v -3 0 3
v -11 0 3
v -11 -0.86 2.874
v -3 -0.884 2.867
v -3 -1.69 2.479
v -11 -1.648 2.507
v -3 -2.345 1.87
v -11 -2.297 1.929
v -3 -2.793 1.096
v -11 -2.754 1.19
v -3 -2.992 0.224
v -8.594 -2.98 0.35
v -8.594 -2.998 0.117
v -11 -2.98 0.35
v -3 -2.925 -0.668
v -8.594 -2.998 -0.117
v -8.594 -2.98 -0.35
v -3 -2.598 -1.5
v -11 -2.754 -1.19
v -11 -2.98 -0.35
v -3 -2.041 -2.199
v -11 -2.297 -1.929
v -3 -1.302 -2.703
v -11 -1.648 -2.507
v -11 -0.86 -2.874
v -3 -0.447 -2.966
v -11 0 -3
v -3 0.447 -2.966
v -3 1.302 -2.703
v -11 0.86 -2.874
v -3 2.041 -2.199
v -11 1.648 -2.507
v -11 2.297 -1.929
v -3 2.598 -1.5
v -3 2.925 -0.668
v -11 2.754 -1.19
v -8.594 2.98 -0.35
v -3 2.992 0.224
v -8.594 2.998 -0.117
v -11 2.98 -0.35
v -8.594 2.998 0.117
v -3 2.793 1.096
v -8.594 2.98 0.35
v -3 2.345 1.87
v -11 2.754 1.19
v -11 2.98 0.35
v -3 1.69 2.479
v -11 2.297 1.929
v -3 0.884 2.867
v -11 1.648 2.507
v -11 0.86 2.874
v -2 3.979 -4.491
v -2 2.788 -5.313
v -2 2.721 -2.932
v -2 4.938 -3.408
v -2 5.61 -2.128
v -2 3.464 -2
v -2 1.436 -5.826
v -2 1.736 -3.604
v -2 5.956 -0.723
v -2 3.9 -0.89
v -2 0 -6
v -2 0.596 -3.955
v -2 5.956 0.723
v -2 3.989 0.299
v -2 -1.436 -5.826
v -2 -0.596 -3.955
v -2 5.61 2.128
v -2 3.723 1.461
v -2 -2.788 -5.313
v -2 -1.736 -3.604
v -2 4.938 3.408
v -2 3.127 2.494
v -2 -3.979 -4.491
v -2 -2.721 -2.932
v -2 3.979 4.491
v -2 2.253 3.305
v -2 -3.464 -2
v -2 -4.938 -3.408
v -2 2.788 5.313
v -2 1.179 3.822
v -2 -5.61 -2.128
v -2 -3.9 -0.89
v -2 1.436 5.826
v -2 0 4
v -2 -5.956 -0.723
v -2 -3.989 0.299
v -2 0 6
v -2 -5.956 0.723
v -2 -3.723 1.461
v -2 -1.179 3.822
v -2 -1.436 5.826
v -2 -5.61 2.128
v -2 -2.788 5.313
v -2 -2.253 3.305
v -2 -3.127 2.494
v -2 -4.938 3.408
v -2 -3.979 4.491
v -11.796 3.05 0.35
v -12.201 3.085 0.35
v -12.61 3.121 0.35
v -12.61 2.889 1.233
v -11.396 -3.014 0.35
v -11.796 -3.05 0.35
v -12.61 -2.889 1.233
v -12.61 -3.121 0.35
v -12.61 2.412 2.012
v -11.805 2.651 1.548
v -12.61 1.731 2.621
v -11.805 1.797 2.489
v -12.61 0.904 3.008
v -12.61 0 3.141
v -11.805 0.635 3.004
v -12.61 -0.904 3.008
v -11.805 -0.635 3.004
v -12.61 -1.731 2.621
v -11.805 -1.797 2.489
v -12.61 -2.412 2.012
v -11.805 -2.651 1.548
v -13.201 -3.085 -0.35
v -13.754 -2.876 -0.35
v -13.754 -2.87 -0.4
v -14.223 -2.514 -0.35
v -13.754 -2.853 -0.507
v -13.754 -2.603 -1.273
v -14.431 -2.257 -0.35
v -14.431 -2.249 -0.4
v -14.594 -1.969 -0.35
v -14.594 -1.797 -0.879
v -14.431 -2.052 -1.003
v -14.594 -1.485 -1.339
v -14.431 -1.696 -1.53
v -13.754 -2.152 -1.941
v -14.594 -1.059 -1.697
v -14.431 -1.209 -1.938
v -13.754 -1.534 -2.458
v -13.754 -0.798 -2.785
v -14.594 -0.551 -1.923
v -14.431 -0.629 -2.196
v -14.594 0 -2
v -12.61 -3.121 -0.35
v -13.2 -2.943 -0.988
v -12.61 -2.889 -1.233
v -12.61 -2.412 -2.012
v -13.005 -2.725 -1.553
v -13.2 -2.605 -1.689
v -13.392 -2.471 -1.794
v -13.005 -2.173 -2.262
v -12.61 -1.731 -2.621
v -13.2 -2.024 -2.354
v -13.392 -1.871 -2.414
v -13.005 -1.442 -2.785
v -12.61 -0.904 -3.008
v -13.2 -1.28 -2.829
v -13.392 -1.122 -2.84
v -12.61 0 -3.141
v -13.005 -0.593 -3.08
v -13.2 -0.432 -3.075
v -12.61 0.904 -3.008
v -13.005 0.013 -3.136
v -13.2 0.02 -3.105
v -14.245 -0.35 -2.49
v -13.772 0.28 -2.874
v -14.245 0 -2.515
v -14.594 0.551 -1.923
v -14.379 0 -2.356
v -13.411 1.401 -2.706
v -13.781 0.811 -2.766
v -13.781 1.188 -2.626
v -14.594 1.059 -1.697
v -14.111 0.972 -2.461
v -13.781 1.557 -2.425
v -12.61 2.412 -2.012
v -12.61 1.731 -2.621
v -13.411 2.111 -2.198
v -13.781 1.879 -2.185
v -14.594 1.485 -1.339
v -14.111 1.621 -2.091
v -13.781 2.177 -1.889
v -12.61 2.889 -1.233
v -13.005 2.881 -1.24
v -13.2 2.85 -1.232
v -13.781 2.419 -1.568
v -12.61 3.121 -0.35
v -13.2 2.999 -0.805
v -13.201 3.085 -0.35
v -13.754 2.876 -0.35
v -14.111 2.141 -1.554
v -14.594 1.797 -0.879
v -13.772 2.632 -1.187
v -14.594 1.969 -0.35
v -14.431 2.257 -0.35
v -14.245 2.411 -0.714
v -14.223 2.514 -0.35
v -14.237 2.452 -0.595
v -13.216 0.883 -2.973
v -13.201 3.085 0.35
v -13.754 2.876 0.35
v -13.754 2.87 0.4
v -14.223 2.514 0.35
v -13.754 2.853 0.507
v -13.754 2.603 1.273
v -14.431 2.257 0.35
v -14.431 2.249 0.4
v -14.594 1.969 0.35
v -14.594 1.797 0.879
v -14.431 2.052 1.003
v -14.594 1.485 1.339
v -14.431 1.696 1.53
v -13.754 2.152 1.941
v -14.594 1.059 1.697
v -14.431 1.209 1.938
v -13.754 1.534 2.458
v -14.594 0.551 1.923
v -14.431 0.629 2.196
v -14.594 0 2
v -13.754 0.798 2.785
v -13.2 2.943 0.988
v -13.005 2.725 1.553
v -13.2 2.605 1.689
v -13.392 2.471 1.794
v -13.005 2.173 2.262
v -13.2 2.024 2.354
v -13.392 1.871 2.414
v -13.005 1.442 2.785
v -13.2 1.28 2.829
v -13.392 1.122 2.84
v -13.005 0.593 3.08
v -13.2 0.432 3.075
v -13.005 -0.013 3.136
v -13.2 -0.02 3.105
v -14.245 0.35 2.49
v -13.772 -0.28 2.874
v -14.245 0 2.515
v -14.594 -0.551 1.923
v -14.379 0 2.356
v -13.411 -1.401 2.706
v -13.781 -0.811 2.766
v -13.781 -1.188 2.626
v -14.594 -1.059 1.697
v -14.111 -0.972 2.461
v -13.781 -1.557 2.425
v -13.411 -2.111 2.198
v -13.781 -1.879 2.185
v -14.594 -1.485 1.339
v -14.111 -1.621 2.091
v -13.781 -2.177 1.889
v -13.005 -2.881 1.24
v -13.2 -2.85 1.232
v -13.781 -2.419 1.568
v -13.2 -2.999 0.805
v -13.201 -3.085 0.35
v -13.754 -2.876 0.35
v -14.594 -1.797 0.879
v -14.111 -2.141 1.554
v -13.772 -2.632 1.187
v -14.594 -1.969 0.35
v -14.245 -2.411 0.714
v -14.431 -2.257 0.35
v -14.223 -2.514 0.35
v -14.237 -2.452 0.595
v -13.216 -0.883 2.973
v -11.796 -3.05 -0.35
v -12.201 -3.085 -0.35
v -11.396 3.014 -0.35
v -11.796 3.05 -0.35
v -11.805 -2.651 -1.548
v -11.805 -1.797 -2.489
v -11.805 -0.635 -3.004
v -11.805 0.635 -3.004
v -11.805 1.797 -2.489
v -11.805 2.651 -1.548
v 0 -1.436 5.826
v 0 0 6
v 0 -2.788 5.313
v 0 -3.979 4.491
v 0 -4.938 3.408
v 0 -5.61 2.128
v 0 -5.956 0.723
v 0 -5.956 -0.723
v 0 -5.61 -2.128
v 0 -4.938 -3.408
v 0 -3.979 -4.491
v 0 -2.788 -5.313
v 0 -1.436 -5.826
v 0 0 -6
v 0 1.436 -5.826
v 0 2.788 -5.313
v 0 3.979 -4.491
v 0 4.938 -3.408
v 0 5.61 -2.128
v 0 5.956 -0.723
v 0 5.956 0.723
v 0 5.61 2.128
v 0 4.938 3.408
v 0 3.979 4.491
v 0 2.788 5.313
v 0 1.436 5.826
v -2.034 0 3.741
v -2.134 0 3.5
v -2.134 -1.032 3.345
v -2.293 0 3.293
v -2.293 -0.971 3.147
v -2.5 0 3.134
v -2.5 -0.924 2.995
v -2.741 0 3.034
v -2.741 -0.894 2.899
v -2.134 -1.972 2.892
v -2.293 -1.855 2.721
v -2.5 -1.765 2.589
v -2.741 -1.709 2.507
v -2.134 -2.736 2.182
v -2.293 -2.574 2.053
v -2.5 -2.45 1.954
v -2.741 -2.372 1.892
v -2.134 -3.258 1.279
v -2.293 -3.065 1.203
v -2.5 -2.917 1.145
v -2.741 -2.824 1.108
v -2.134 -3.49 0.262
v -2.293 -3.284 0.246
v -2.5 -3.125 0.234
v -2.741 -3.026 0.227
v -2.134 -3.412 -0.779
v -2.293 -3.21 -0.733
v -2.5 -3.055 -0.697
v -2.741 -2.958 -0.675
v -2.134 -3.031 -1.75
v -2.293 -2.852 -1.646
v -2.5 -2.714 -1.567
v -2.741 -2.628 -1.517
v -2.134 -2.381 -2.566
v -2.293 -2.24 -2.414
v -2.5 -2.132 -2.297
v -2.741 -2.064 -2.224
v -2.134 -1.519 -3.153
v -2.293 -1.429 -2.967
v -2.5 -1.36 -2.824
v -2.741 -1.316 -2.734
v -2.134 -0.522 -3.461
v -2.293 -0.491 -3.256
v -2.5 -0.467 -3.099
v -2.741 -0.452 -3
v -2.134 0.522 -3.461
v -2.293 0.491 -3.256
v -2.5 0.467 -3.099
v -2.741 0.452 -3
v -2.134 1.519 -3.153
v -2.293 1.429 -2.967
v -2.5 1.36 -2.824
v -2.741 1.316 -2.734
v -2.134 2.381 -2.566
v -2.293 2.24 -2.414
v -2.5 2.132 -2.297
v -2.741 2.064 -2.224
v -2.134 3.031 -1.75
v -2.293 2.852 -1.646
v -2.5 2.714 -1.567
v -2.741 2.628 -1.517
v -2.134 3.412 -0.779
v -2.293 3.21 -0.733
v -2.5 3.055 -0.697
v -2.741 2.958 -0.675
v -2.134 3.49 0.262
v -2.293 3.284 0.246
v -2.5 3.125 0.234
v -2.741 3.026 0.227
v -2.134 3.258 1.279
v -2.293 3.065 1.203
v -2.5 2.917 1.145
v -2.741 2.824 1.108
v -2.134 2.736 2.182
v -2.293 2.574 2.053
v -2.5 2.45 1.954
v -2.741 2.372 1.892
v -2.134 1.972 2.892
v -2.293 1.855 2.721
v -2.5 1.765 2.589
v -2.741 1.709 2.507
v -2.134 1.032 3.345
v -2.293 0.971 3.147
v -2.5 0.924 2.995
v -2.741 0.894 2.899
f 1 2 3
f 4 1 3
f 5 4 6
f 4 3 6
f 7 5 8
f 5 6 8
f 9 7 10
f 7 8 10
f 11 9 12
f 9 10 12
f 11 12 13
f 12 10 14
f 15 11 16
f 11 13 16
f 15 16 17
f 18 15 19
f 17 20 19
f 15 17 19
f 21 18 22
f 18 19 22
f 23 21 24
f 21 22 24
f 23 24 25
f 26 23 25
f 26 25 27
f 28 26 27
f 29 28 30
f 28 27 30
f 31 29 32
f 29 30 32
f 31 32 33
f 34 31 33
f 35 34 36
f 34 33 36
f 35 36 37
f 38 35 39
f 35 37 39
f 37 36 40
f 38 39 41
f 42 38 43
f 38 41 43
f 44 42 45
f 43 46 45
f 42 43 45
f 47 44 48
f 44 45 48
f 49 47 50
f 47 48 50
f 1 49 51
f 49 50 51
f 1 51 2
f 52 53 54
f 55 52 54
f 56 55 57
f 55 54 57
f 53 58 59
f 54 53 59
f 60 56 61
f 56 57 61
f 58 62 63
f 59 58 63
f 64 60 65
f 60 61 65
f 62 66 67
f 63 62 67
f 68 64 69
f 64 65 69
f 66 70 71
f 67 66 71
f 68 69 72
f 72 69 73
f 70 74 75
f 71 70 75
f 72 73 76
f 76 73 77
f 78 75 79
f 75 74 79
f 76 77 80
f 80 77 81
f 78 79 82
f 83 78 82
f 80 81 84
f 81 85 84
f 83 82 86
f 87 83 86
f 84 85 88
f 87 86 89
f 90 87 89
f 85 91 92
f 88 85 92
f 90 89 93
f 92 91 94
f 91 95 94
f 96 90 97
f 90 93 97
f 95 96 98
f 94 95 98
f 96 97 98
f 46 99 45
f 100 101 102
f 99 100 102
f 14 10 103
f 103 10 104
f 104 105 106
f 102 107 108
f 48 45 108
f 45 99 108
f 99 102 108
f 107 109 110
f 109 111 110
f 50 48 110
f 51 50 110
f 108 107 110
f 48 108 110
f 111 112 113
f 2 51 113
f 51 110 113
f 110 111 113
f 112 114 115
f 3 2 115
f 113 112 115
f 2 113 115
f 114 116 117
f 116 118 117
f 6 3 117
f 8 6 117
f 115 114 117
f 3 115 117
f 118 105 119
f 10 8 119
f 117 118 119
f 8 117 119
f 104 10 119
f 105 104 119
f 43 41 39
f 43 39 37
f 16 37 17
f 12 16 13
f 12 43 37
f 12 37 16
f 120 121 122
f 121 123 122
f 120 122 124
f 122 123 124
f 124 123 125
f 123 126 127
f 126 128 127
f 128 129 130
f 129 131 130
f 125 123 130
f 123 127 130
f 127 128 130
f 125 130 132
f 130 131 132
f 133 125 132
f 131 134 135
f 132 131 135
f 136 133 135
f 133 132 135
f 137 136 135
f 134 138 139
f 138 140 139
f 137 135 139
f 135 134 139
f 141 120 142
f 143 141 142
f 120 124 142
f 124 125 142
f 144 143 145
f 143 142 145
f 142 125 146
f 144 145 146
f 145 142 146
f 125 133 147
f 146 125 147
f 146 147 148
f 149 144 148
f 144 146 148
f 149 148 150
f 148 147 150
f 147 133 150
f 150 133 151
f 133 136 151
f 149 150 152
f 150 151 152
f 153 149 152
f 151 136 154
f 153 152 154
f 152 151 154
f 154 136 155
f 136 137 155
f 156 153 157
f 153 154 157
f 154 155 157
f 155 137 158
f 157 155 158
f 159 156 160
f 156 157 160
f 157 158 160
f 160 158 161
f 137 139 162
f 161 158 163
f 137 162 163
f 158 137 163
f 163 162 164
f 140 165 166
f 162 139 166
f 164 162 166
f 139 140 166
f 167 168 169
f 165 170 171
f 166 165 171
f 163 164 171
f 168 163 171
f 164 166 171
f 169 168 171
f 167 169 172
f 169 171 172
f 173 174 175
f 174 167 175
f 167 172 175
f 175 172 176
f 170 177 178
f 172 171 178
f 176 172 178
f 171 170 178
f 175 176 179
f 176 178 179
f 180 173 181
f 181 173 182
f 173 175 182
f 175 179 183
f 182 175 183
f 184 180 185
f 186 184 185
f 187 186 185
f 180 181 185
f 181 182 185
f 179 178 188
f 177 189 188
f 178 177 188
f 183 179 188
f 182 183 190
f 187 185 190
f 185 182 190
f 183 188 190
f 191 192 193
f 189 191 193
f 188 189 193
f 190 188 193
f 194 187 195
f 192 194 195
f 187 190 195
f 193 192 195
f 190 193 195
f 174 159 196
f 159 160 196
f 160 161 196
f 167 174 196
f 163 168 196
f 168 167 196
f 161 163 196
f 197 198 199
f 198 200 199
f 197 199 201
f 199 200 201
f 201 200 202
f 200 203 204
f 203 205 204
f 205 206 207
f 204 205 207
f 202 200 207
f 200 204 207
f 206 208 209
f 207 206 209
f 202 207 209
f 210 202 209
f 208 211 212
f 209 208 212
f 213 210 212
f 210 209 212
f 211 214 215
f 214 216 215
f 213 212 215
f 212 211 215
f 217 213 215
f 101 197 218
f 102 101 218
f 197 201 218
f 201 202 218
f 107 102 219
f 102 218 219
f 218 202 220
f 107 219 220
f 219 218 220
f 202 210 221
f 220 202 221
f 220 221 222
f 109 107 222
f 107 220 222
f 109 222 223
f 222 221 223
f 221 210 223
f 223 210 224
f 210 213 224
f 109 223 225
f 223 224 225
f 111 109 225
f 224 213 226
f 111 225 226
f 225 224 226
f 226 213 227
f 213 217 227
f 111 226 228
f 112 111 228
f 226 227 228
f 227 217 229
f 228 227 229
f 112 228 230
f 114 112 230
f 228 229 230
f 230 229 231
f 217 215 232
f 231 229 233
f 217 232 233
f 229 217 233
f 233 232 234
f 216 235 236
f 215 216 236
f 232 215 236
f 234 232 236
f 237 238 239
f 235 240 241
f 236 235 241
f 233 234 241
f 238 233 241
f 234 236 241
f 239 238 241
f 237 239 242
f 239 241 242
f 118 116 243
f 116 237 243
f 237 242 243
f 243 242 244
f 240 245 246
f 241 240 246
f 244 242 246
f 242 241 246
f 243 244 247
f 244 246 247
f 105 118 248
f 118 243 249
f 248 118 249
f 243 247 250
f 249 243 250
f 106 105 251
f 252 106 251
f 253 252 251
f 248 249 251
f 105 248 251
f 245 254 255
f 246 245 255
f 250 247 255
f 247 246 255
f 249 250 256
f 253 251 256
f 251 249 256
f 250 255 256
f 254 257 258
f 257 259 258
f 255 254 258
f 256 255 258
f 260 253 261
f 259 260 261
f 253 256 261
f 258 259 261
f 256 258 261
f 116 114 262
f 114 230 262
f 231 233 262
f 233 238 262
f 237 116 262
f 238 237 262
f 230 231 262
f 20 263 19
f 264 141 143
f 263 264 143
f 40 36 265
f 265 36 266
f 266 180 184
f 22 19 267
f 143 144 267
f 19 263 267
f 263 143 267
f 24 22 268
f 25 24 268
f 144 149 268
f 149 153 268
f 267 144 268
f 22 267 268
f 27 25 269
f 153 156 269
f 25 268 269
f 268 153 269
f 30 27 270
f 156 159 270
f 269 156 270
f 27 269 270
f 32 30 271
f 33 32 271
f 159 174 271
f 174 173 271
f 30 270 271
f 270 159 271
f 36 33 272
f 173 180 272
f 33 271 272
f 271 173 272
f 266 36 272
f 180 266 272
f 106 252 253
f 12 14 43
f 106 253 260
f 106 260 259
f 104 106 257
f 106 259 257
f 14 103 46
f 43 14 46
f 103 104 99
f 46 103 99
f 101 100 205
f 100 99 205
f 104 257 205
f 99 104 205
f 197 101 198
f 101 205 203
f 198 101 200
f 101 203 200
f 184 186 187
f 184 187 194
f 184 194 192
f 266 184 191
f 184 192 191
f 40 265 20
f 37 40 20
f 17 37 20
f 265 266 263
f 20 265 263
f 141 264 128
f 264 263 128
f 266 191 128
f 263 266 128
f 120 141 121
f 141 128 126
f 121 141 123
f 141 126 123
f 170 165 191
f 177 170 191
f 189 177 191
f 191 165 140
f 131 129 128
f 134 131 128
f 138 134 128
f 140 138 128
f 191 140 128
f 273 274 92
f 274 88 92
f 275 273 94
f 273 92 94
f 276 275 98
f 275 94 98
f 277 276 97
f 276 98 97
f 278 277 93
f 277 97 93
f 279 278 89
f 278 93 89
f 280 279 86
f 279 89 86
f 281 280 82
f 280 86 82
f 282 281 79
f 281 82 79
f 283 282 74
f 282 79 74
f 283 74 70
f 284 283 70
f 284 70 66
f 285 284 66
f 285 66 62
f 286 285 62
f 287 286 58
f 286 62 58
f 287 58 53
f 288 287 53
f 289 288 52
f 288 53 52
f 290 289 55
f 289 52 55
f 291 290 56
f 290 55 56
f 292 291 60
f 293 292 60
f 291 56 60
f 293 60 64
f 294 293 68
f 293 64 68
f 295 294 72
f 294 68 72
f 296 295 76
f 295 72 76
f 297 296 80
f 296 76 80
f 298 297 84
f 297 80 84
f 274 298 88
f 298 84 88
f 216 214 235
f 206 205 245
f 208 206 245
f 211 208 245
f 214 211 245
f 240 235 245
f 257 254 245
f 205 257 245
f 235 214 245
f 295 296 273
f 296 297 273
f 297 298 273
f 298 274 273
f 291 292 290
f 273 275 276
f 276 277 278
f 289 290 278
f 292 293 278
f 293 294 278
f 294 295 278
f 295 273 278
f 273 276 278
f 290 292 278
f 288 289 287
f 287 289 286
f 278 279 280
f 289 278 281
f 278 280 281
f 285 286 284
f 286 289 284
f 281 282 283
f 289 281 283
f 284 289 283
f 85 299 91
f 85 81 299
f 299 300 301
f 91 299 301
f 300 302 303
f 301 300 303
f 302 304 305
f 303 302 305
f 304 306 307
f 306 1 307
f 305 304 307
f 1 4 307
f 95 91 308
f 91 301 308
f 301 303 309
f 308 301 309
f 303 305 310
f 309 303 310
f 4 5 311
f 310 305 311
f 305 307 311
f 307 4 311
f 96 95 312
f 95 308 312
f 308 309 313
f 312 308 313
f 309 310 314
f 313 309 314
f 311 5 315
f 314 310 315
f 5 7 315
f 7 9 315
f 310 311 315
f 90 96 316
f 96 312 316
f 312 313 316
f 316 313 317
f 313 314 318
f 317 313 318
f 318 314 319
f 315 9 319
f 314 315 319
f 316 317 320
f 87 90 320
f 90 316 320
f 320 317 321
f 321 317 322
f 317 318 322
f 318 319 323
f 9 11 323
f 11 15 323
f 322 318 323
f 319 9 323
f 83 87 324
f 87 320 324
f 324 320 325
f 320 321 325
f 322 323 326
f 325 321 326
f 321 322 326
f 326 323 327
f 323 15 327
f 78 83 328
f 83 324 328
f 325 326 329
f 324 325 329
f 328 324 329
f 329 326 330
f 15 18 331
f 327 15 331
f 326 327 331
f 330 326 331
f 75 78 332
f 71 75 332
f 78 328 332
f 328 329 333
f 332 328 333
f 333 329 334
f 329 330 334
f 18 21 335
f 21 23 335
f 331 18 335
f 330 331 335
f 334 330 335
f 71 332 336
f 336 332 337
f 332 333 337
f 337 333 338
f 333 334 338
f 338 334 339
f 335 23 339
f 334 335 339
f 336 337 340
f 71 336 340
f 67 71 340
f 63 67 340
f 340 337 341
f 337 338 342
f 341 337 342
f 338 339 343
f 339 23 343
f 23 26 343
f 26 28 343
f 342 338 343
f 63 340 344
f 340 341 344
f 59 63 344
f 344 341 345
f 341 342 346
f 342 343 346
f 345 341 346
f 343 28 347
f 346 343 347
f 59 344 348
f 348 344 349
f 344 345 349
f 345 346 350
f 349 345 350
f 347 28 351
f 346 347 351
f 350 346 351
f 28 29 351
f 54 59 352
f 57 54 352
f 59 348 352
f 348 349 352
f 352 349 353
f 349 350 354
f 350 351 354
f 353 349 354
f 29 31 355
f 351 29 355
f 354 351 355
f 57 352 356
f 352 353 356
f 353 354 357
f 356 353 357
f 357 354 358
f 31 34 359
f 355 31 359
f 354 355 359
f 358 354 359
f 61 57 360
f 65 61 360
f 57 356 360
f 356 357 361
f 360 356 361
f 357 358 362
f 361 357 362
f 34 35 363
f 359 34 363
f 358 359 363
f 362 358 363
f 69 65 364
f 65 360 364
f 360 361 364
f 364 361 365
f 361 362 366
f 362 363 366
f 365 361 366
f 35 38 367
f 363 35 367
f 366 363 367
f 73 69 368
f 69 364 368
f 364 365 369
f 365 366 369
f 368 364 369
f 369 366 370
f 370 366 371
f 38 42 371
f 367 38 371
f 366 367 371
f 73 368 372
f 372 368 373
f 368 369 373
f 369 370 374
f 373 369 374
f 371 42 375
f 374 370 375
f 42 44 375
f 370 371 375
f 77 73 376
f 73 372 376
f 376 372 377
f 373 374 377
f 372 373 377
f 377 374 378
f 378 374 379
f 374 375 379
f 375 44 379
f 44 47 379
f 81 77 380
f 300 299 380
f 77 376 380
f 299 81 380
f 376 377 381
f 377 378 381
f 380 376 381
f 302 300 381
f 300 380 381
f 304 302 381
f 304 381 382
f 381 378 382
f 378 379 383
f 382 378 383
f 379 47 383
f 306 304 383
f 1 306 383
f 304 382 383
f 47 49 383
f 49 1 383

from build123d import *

# Parameters (mm, degrees)
F3_DEPTH = 6
F4_R     = 1


with BuildPart() as f1:
    # F0 (on Front) → F1 (revolve)
    with BuildSketch(Plane.XZ):
        with BuildLine():
            Line((-14.5940445242, 0), (0, 0))
            Line((0, 0), (0, 6))
            Line((0, 6), (-2, 6))
            Line((-2, 6), (-2, 3))
            Line((-2, 3), (-11, 3))
            Line((-11, 3), (-12.6100640914, 3.1408623555))
            ThreePointArc((-12.6100640914, 3.1408623555), (-13.7813661664, 2.8822577685), (-14.5940445242, 2))
            Line((-14.5940445242, 2), (-14.5940445242, 0))
        make_face()
    revolve(axis=Axis((-7.2970222621, 0, 0), (1, 0, 0)))

    # F2 (on face) → F3 (cut)
    with BuildSketch(Plane(origin=(-14.5940445242, 0, 0), x_dir=(0, -1, 0), z_dir=(-1, 0, 0))):
        with BuildLine():
            ThreePointArc((-1.9691368668, -0.35), (-2, 0), (-1.9691368668, 0.35))
            Line((-1.9691368668, 0.35), (-4, 0.35))
            Line((-4, 0.35), (-4, -0.35))
            Line((-4, -0.35), (-2.9795133831, -0.35))
            Line((-2.9795133831, -0.35), (-1.9691368668, -0.35))
        make_face()
        with BuildLine():
            Line((1.9691368668, 0.35), (0.25, 0.35))
            Line((0.25, 0.35), (0.25, 0))
            Line((0.25, 0), (0.25, -0.35))
            Line((0.25, -0.35), (1.9691368668, -0.35))
            ThreePointArc((1.9691368668, -0.35), (1.9922692757, -0.1756790632), (2, 0))
            ThreePointArc((2, 0), (1.9922692757, 0.1756790632), (1.9691368668, 0.35))
        make_face()
        with BuildLine():
            Line((-0.25, 0), (-0.25, 0.35))
            Line((-0.25, 0.35), (-1.9691368668, 0.35))
            ThreePointArc((-1.9691368668, 0.35), (-2, 0), (-1.9691368668, -0.35))
            Line((-1.9691368668, -0.35), (-0.25, -0.35))
            Line((-0.25, -0.35), (-0.25, 0))
        make_face()
        Polygon((0.25, 0), (0.25, 0.35), (-0.25, 0.35), (-0.25, 0), (-0.25, -0.35), (0.25, -0.35), align=None)
        with BuildLine():
            Line((4, 0.35), (1.9691368668, 0.35))
            ThreePointArc((1.9691368668, 0.35), (1.9922692757, 0.1756790632), (2, 0))
            ThreePointArc((2, 0), (1.9922692757, -0.1756790632), (1.9691368668, -0.35))
            Line((1.9691368668, -0.35), (2.9795133831, -0.35))
            Line((2.9795133831, -0.35), (4, -0.35))
            Line((4, -0.35), (4, 0.35))
        make_face()
    extrude(amount=-F3_DEPTH, mode=Mode.SUBTRACT)

    # F4
    f4_edges = [f1.edges().sort_by_distance(p)[0] for p in [
        (-2, 0, -3),
    ]]
    fillet(f4_edges, radius=F4_R)


solid = f1.part
